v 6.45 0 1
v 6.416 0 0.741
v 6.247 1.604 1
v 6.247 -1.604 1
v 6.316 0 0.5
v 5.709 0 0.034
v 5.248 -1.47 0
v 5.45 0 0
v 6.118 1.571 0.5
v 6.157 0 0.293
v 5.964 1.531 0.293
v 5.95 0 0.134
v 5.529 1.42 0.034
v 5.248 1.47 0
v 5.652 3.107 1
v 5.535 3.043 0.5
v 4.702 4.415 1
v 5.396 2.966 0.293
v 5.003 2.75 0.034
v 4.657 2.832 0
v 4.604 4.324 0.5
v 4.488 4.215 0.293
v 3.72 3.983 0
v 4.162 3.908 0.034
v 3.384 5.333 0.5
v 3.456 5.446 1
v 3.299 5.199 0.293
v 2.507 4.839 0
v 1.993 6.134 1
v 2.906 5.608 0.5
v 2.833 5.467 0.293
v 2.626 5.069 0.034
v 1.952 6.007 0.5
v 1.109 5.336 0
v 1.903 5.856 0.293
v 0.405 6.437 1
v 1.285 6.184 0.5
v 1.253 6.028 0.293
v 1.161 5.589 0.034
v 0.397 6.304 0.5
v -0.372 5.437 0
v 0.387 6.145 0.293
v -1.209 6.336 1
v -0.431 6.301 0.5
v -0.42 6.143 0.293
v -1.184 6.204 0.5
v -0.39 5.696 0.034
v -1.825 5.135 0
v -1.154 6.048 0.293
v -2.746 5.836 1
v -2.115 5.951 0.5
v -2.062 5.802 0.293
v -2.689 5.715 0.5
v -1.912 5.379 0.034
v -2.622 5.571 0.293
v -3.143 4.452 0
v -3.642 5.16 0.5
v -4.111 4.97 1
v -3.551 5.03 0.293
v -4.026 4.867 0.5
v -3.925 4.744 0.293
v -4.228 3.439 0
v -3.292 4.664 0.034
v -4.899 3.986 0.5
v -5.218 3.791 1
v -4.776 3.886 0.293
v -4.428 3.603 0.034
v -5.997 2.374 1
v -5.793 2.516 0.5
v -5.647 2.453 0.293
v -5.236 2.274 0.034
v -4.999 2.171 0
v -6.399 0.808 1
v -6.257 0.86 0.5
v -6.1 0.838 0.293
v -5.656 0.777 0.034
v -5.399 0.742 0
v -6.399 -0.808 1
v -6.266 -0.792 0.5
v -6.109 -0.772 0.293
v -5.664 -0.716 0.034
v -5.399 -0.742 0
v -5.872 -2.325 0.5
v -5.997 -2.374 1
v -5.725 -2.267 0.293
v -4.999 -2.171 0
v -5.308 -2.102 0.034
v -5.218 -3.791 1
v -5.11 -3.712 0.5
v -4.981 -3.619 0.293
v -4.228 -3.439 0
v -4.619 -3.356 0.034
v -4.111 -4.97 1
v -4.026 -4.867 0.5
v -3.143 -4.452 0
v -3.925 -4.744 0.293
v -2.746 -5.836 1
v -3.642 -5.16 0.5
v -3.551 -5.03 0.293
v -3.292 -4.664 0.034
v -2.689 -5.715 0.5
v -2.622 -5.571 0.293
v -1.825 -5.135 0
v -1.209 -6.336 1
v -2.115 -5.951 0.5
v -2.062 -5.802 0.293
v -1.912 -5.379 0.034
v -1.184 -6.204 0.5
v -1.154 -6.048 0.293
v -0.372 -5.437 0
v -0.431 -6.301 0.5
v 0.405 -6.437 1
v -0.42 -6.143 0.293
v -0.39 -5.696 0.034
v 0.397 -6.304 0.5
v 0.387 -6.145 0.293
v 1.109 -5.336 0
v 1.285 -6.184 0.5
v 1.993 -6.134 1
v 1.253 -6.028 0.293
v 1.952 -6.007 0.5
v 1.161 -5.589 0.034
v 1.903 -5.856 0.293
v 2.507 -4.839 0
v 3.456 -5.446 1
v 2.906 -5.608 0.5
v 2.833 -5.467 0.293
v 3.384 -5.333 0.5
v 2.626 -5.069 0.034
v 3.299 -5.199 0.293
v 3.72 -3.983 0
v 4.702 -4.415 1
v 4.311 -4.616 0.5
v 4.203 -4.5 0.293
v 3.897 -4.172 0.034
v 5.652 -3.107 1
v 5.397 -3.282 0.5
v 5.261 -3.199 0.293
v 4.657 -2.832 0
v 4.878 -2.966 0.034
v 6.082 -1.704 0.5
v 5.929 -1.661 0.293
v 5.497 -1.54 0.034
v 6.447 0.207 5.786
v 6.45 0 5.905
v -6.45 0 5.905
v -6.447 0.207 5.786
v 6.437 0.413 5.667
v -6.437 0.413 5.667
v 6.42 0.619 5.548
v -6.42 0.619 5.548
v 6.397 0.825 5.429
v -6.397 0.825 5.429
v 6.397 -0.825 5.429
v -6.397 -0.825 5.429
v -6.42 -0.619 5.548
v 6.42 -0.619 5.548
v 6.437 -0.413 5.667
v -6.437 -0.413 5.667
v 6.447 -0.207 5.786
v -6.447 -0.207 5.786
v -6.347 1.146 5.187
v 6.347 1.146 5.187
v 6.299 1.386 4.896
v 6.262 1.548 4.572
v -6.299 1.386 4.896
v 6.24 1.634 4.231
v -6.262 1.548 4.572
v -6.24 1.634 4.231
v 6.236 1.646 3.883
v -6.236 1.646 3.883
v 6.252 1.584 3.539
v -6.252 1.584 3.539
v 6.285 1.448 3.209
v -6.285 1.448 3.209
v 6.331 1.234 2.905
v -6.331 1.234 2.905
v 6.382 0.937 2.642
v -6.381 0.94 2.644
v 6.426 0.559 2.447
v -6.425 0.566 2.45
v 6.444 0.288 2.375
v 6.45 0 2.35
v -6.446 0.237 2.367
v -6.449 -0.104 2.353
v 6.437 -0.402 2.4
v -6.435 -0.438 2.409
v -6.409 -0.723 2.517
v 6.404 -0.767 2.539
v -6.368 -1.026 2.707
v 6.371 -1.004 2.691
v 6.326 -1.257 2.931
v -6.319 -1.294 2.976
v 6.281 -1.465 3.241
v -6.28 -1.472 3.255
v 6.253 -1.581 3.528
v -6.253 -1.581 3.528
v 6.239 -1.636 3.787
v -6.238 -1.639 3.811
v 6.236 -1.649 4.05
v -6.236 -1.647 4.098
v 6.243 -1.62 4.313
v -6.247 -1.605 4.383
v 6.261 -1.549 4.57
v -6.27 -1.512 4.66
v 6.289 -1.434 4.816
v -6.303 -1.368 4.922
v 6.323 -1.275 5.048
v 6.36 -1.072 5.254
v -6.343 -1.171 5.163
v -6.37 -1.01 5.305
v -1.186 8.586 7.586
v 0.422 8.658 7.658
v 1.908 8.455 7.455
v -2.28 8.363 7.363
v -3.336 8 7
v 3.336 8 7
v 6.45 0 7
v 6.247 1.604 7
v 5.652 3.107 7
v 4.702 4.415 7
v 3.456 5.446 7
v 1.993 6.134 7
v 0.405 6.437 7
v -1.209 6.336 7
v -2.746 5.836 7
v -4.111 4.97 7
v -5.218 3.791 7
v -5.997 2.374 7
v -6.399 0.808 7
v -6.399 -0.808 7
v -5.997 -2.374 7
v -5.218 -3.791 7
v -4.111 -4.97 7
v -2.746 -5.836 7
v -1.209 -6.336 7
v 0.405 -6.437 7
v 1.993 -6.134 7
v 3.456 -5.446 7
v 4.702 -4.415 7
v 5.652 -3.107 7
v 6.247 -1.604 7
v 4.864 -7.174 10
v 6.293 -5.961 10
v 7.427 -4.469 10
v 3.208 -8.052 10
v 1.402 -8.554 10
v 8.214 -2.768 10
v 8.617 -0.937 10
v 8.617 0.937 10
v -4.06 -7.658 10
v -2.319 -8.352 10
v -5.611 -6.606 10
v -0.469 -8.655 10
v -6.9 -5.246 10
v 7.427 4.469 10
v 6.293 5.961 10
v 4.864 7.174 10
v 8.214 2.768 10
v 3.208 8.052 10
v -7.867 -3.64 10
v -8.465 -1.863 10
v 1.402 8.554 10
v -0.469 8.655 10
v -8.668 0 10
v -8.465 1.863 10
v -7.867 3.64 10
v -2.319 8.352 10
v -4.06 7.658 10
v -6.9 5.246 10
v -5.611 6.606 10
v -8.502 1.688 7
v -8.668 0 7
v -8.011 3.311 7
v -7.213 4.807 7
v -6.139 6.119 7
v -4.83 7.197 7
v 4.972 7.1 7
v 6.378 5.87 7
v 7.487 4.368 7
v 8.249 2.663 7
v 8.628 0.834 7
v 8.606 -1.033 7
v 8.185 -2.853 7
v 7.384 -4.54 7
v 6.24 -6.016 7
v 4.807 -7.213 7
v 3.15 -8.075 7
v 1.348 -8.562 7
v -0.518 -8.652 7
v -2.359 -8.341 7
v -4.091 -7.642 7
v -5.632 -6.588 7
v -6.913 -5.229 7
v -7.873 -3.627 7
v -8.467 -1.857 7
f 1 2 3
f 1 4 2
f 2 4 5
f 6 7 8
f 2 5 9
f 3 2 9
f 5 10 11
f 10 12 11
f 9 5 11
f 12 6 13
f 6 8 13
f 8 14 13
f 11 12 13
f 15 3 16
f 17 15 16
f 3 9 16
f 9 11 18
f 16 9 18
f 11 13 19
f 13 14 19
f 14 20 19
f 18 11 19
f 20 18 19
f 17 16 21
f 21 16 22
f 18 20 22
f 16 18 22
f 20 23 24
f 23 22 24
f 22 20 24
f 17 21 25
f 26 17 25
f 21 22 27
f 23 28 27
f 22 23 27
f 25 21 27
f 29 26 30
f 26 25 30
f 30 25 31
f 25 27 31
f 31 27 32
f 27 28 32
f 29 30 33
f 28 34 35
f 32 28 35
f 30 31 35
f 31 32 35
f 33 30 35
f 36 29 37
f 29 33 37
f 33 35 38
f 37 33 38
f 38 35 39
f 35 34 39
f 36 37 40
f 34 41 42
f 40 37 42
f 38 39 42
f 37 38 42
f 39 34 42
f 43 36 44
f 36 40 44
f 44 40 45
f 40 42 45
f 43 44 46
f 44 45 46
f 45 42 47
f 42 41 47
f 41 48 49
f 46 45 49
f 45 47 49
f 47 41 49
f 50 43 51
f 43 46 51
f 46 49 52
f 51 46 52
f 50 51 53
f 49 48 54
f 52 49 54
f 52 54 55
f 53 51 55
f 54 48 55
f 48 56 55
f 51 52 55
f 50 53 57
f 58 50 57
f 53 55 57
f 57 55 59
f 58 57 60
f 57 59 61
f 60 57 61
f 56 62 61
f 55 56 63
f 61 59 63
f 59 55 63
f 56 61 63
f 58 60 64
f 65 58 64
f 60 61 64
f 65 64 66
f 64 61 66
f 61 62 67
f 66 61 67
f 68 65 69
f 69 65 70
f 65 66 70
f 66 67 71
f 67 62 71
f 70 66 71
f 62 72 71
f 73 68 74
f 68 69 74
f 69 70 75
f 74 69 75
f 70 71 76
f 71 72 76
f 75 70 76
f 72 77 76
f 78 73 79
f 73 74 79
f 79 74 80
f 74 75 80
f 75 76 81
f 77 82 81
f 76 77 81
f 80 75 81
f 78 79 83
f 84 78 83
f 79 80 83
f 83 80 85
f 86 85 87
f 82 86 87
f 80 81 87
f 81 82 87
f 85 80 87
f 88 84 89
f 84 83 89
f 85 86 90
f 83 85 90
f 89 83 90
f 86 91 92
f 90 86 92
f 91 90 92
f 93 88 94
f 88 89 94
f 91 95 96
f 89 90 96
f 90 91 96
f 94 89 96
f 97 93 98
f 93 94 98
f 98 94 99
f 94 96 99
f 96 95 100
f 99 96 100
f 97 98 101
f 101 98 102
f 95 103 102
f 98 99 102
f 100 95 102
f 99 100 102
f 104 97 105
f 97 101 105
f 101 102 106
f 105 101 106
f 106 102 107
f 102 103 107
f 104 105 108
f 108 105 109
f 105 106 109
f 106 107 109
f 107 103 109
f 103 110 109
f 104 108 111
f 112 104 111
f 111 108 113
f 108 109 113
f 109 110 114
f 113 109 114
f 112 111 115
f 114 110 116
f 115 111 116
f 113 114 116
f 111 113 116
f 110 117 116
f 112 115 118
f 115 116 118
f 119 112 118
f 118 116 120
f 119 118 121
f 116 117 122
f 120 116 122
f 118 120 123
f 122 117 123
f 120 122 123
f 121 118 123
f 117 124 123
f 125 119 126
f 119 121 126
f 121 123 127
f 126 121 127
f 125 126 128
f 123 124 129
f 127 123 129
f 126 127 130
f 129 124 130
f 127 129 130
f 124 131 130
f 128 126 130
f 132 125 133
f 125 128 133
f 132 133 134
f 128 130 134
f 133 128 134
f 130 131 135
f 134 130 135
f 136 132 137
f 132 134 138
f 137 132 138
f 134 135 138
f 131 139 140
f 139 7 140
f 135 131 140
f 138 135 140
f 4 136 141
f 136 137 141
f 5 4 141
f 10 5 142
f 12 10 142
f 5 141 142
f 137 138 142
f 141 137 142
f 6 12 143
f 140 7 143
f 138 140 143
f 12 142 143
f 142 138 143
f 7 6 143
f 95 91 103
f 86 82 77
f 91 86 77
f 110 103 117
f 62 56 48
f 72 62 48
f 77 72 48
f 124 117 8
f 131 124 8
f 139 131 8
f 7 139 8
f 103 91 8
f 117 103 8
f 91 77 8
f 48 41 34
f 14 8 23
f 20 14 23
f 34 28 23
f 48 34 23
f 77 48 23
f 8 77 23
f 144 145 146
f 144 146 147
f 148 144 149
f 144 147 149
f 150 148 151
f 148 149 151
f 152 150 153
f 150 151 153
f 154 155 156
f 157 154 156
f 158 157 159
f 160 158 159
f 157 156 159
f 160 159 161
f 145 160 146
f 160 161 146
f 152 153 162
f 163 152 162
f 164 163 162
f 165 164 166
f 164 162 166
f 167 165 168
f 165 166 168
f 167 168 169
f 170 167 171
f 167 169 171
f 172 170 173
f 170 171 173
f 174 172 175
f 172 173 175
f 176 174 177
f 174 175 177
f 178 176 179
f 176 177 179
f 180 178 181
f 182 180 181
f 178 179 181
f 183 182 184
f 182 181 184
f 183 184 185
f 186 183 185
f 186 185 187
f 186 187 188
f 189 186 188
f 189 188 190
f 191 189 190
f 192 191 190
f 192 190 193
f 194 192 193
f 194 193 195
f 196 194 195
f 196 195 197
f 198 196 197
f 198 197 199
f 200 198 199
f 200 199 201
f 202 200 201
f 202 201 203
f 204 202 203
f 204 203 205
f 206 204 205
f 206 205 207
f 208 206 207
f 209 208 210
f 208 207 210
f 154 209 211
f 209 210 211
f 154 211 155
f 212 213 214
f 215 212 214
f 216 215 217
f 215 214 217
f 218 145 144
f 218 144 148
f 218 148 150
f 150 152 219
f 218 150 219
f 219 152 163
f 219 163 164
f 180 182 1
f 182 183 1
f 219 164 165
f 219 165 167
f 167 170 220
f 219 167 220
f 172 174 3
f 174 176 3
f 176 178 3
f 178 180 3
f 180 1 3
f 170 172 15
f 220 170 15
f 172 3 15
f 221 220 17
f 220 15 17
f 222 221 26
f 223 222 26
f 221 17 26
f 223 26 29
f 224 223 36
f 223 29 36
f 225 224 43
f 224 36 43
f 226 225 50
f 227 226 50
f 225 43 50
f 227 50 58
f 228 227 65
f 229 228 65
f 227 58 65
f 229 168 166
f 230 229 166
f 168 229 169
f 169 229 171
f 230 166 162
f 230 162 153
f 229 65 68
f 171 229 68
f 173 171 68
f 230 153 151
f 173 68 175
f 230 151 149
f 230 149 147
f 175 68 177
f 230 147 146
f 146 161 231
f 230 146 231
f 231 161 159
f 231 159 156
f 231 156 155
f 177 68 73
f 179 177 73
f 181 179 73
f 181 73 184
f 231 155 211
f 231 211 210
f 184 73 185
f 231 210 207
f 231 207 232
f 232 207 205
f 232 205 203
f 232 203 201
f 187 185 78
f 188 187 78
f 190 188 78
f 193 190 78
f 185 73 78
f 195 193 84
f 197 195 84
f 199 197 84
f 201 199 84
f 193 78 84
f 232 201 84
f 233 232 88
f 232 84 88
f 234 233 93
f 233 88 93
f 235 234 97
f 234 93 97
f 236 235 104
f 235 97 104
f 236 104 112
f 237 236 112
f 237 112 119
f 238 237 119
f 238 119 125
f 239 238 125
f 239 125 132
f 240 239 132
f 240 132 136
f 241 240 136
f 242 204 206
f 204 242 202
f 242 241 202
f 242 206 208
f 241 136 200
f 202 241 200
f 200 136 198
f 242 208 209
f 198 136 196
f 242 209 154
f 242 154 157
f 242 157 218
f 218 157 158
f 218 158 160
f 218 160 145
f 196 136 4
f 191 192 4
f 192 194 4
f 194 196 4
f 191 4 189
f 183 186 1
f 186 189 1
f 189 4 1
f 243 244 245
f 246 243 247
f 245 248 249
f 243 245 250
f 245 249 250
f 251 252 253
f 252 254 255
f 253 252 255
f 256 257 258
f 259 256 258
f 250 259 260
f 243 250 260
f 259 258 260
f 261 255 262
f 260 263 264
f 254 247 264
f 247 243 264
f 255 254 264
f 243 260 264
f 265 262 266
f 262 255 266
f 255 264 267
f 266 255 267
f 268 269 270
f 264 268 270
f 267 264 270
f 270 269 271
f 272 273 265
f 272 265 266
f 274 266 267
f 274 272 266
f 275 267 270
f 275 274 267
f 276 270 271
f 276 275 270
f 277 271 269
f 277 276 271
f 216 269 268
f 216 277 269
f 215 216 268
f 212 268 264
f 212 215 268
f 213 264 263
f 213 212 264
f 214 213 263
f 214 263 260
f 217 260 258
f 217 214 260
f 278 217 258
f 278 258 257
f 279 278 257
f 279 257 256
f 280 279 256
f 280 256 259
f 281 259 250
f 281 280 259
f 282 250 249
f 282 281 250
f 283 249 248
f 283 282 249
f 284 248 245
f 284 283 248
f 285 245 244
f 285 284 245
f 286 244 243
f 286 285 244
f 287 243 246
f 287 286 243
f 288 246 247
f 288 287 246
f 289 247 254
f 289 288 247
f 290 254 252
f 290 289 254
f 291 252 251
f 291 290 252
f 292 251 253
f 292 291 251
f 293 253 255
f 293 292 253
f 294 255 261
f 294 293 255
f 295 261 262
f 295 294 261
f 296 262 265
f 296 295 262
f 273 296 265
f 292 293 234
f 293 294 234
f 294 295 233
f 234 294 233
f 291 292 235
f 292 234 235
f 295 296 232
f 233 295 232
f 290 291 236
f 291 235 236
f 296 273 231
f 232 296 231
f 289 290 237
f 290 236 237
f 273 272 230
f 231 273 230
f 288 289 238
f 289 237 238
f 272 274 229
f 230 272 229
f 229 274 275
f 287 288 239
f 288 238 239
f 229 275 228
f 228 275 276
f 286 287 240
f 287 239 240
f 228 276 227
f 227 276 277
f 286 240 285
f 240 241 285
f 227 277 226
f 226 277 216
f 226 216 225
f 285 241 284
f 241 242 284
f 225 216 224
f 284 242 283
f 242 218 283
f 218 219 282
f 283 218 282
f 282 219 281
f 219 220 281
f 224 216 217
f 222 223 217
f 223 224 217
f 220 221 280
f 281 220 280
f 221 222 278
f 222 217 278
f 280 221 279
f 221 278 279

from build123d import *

# Parameters (mm, degrees)
SKETCH_1_R               = 6.45
EXTRUDE_1_DEPTH          = 7
SKETCH_2_W               = 29.5
SKETCH_2_H               = 18
EXTRUDE_2_DEPTH          = 3
EXTRUDE_START            = 14.75
SKETCH_3_R               = 1.65
EXTRUDE_3_DEPTH          = 5
EXTRUDE_START_2          = -14.75
SKETCH_3_2_R             = 1.65
EXTRUDE_4_DEPTH          = 5
EXTRUDE_5_DEPTH          = 10
FILLET_1_R               = 5
SKETCH_5_R               = 2.5
CUT_EXTRUDE_1_DEPTH      = 11
CHAMFER_1_SIZE           = 1
CHAMFER_2_SIZE           = 1
CUT_EXTRUDE_2_DEPTH      = 15.75
CUT_EXTRUDE_2_DEPTH_BACK = 15.75
FILLET_2_R               = 1
SKETCH_7_OUTSIDE_W       = 42.194
SKETCH_7_OUTSIDE_H       = 45.694
SKETCH_7_OUTSIDE_R       = 8.66784174
CUT_EXTRUDE_3_DEPTH      = 1
CUT_EXTRUDE_3_DEPTH_BACK = 31


with BuildPart() as part:
    # ｽｹｯﾁ1 → ﾎﾞｽ - 押し出し1 (new body)
    with BuildSketch(Plane.XY):
        Circle(SKETCH_1_R)
    extrude(amount=EXTRUDE_1_DEPTH)

    # ｽｹｯﾁ2 → ﾎﾞｽ - 押し出し2 (add)
    with BuildSketch(Plane.XY.offset(7)):
        Rectangle(SKETCH_2_W, SKETCH_2_H)
    extrude(amount=EXTRUDE_2_DEPTH)

    # ｽｹｯﾁ3 → ﾎﾞｽ - 押し出し3 (add)
    with BuildSketch(Plane(origin=(0, 0, 0), x_dir=(0, 0, -1), z_dir=(1, 0, 0)).offset(EXTRUDE_START)):
        with BuildLine():
            Line((-10, 9), (-23.333333333, 13.714045208))
            ThreePointArc((-23.333333333, 13.714045208), (-29.386897866, 11.398984601), (-28.069570429, 5.053135753))
            Line((-28.069570429, 5.053135753), (-10, -9))
            Line((-10, -9), (-10, 9))
        make_face()
        with Locations((-25, 9)):
            Circle(SKETCH_3_R, mode=Mode.SUBTRACT)
    extrude(amount=-EXTRUDE_3_DEPTH)

    # ｽｹｯﾁ3<2> → ﾎﾞｽ - 押し出し4 (add)
    with BuildSketch(Plane(origin=(0, 0, 0), x_dir=(0, 0, -1), z_dir=(1, 0, 0)).offset(EXTRUDE_START_2)):
        with BuildLine():
            Line((-10, 9), (-23.333333333, 13.714045208))
            ThreePointArc((-23.333333333, 13.714045208), (-29.386897866, 11.398984601), (-28.069570429, 5.053135753))
            Line((-28.069570429, 5.053135753), (-10, -9))
            Line((-10, -9), (-10, 9))
        make_face()
        with Locations((-25, 9)):
            Circle(SKETCH_3_2_R, mode=Mode.SUBTRACT)
    extrude(amount=EXTRUDE_4_DEPTH)

    # ｽｹｯﾁ4 → ﾎﾞｽ - 押し出し5 (add)
    with BuildSketch(Plane.XZ.offset(9)):
        Polygon((-14.75, 7), (14.75, 7), (14.75, 10), (9.75, 10), (-9.75, 10), (-14.75, 10), align=None)
    extrude(amount=EXTRUDE_5_DEPTH)

    # ﾌｨﾚｯﾄ1
    fillet_1_edges = [part.edges().sort_by_distance(p)[0] for p in [
        (-14.75, -19, 8.5),
        (14.75, -19, 8.5),
    ]]
    fillet(fillet_1_edges, radius=FILLET_1_R)

    # ｽｹｯﾁ5 → ｶｯﾄ - 押し出し1 (cut, through all)
    with BuildSketch(Plane.XY.offset(10)):
        with Locations((0, -14)):
            Circle(SKETCH_5_R)
        with Locations((-9.75, -14)):
            Circle(SKETCH_5_R)
        with Locations((9.75, -14)):
            Circle(SKETCH_5_R)
    extrude(amount=-CUT_EXTRUDE_1_DEPTH, mode=Mode.SUBTRACT)

    # 面取り1
    chamfer_1_edges = [part.edges().sort_by_distance(p)[0] for p in [
        (7.25, -14, 7),
        (7.25, -14, 10),
        (-12.25, -14, 7),
        (-12.25, -14, 10),
        (-2.5, -14, 7),
        (-2.5, -14, 10),
    ]]
    chamfer(chamfer_1_edges, length=CHAMFER_1_SIZE)

    # 面取り2
    chamfer_2_edges = [part.edges().sort_by_distance(p)[0] for p in [
        (-14.75, 9, 8.5),
        (0, 9, 7),
        (14.75, 9, 8.5),
        (-14.75, 11.357022604, 16.666666667),
        (-14.75, 11.398984601, 29.386897866),
        (-14.75, -1.973432123, 19.034785215),
        (14.75, 11.357022604, 16.666666667),
        (14.75, 11.398984601, 29.386897866),
        (14.75, -1.973432123, 19.034785215),
    ]]
    chamfer(chamfer_2_edges, length=CHAMFER_2_SIZE)

    # ｽｹｯﾁ6 → ｶｯﾄ - 押し出し2 (cut, two sides)
    with BuildSketch(Plane(origin=(0, 0, 0), x_dir=(0, 0, -1), z_dir=(1, 0, 0))) as cut_extrude_2_sk:
        with BuildLine():
            Line((-5.428941916, -0.825), (-5.905255888, 0))
            Line((-5.905255888, 0), (-5.428941916, 0.825))
            ThreePointArc((-5.428941916, 0.825), (-2.35, 0), (-5.428941916, -0.825))
        make_face()
    extrude(amount=CUT_EXTRUDE_2_DEPTH, mode=Mode.SUBTRACT)
    extrude(cut_extrude_2_sk.sketch, amount=-CUT_EXTRUDE_2_DEPTH_BACK, mode=Mode.SUBTRACT)

    # ﾌｨﾚｯﾄ2
    fillet_2_edges = [part.edges().sort_by_distance(p)[0] for p in [
        (-6.45, 0, 0),
    ]]
    fillet(fillet_2_edges, radius=FILLET_2_R)

    # ｽｹｯﾁ7 outside → ｶｯﾄ - 押し出し3 (cut, two sides)
    with BuildSketch(Plane(origin=(0, 0, 0), x_dir=(-1, 0, 0), z_dir=(0, 0, -1))) as cut_extrude_3_sk:
        with Locations((0, -2.5)):
            Rectangle(SKETCH_7_OUTSIDE_W, SKETCH_7_OUTSIDE_H)
        Circle(SKETCH_7_OUTSIDE_R, mode=Mode.SUBTRACT)
    extrude(amount=CUT_EXTRUDE_3_DEPTH, mode=Mode.SUBTRACT)
    extrude(cut_extrude_3_sk.sketch, amount=-CUT_EXTRUDE_3_DEPTH_BACK, mode=Mode.SUBTRACT)


solid = part.part
